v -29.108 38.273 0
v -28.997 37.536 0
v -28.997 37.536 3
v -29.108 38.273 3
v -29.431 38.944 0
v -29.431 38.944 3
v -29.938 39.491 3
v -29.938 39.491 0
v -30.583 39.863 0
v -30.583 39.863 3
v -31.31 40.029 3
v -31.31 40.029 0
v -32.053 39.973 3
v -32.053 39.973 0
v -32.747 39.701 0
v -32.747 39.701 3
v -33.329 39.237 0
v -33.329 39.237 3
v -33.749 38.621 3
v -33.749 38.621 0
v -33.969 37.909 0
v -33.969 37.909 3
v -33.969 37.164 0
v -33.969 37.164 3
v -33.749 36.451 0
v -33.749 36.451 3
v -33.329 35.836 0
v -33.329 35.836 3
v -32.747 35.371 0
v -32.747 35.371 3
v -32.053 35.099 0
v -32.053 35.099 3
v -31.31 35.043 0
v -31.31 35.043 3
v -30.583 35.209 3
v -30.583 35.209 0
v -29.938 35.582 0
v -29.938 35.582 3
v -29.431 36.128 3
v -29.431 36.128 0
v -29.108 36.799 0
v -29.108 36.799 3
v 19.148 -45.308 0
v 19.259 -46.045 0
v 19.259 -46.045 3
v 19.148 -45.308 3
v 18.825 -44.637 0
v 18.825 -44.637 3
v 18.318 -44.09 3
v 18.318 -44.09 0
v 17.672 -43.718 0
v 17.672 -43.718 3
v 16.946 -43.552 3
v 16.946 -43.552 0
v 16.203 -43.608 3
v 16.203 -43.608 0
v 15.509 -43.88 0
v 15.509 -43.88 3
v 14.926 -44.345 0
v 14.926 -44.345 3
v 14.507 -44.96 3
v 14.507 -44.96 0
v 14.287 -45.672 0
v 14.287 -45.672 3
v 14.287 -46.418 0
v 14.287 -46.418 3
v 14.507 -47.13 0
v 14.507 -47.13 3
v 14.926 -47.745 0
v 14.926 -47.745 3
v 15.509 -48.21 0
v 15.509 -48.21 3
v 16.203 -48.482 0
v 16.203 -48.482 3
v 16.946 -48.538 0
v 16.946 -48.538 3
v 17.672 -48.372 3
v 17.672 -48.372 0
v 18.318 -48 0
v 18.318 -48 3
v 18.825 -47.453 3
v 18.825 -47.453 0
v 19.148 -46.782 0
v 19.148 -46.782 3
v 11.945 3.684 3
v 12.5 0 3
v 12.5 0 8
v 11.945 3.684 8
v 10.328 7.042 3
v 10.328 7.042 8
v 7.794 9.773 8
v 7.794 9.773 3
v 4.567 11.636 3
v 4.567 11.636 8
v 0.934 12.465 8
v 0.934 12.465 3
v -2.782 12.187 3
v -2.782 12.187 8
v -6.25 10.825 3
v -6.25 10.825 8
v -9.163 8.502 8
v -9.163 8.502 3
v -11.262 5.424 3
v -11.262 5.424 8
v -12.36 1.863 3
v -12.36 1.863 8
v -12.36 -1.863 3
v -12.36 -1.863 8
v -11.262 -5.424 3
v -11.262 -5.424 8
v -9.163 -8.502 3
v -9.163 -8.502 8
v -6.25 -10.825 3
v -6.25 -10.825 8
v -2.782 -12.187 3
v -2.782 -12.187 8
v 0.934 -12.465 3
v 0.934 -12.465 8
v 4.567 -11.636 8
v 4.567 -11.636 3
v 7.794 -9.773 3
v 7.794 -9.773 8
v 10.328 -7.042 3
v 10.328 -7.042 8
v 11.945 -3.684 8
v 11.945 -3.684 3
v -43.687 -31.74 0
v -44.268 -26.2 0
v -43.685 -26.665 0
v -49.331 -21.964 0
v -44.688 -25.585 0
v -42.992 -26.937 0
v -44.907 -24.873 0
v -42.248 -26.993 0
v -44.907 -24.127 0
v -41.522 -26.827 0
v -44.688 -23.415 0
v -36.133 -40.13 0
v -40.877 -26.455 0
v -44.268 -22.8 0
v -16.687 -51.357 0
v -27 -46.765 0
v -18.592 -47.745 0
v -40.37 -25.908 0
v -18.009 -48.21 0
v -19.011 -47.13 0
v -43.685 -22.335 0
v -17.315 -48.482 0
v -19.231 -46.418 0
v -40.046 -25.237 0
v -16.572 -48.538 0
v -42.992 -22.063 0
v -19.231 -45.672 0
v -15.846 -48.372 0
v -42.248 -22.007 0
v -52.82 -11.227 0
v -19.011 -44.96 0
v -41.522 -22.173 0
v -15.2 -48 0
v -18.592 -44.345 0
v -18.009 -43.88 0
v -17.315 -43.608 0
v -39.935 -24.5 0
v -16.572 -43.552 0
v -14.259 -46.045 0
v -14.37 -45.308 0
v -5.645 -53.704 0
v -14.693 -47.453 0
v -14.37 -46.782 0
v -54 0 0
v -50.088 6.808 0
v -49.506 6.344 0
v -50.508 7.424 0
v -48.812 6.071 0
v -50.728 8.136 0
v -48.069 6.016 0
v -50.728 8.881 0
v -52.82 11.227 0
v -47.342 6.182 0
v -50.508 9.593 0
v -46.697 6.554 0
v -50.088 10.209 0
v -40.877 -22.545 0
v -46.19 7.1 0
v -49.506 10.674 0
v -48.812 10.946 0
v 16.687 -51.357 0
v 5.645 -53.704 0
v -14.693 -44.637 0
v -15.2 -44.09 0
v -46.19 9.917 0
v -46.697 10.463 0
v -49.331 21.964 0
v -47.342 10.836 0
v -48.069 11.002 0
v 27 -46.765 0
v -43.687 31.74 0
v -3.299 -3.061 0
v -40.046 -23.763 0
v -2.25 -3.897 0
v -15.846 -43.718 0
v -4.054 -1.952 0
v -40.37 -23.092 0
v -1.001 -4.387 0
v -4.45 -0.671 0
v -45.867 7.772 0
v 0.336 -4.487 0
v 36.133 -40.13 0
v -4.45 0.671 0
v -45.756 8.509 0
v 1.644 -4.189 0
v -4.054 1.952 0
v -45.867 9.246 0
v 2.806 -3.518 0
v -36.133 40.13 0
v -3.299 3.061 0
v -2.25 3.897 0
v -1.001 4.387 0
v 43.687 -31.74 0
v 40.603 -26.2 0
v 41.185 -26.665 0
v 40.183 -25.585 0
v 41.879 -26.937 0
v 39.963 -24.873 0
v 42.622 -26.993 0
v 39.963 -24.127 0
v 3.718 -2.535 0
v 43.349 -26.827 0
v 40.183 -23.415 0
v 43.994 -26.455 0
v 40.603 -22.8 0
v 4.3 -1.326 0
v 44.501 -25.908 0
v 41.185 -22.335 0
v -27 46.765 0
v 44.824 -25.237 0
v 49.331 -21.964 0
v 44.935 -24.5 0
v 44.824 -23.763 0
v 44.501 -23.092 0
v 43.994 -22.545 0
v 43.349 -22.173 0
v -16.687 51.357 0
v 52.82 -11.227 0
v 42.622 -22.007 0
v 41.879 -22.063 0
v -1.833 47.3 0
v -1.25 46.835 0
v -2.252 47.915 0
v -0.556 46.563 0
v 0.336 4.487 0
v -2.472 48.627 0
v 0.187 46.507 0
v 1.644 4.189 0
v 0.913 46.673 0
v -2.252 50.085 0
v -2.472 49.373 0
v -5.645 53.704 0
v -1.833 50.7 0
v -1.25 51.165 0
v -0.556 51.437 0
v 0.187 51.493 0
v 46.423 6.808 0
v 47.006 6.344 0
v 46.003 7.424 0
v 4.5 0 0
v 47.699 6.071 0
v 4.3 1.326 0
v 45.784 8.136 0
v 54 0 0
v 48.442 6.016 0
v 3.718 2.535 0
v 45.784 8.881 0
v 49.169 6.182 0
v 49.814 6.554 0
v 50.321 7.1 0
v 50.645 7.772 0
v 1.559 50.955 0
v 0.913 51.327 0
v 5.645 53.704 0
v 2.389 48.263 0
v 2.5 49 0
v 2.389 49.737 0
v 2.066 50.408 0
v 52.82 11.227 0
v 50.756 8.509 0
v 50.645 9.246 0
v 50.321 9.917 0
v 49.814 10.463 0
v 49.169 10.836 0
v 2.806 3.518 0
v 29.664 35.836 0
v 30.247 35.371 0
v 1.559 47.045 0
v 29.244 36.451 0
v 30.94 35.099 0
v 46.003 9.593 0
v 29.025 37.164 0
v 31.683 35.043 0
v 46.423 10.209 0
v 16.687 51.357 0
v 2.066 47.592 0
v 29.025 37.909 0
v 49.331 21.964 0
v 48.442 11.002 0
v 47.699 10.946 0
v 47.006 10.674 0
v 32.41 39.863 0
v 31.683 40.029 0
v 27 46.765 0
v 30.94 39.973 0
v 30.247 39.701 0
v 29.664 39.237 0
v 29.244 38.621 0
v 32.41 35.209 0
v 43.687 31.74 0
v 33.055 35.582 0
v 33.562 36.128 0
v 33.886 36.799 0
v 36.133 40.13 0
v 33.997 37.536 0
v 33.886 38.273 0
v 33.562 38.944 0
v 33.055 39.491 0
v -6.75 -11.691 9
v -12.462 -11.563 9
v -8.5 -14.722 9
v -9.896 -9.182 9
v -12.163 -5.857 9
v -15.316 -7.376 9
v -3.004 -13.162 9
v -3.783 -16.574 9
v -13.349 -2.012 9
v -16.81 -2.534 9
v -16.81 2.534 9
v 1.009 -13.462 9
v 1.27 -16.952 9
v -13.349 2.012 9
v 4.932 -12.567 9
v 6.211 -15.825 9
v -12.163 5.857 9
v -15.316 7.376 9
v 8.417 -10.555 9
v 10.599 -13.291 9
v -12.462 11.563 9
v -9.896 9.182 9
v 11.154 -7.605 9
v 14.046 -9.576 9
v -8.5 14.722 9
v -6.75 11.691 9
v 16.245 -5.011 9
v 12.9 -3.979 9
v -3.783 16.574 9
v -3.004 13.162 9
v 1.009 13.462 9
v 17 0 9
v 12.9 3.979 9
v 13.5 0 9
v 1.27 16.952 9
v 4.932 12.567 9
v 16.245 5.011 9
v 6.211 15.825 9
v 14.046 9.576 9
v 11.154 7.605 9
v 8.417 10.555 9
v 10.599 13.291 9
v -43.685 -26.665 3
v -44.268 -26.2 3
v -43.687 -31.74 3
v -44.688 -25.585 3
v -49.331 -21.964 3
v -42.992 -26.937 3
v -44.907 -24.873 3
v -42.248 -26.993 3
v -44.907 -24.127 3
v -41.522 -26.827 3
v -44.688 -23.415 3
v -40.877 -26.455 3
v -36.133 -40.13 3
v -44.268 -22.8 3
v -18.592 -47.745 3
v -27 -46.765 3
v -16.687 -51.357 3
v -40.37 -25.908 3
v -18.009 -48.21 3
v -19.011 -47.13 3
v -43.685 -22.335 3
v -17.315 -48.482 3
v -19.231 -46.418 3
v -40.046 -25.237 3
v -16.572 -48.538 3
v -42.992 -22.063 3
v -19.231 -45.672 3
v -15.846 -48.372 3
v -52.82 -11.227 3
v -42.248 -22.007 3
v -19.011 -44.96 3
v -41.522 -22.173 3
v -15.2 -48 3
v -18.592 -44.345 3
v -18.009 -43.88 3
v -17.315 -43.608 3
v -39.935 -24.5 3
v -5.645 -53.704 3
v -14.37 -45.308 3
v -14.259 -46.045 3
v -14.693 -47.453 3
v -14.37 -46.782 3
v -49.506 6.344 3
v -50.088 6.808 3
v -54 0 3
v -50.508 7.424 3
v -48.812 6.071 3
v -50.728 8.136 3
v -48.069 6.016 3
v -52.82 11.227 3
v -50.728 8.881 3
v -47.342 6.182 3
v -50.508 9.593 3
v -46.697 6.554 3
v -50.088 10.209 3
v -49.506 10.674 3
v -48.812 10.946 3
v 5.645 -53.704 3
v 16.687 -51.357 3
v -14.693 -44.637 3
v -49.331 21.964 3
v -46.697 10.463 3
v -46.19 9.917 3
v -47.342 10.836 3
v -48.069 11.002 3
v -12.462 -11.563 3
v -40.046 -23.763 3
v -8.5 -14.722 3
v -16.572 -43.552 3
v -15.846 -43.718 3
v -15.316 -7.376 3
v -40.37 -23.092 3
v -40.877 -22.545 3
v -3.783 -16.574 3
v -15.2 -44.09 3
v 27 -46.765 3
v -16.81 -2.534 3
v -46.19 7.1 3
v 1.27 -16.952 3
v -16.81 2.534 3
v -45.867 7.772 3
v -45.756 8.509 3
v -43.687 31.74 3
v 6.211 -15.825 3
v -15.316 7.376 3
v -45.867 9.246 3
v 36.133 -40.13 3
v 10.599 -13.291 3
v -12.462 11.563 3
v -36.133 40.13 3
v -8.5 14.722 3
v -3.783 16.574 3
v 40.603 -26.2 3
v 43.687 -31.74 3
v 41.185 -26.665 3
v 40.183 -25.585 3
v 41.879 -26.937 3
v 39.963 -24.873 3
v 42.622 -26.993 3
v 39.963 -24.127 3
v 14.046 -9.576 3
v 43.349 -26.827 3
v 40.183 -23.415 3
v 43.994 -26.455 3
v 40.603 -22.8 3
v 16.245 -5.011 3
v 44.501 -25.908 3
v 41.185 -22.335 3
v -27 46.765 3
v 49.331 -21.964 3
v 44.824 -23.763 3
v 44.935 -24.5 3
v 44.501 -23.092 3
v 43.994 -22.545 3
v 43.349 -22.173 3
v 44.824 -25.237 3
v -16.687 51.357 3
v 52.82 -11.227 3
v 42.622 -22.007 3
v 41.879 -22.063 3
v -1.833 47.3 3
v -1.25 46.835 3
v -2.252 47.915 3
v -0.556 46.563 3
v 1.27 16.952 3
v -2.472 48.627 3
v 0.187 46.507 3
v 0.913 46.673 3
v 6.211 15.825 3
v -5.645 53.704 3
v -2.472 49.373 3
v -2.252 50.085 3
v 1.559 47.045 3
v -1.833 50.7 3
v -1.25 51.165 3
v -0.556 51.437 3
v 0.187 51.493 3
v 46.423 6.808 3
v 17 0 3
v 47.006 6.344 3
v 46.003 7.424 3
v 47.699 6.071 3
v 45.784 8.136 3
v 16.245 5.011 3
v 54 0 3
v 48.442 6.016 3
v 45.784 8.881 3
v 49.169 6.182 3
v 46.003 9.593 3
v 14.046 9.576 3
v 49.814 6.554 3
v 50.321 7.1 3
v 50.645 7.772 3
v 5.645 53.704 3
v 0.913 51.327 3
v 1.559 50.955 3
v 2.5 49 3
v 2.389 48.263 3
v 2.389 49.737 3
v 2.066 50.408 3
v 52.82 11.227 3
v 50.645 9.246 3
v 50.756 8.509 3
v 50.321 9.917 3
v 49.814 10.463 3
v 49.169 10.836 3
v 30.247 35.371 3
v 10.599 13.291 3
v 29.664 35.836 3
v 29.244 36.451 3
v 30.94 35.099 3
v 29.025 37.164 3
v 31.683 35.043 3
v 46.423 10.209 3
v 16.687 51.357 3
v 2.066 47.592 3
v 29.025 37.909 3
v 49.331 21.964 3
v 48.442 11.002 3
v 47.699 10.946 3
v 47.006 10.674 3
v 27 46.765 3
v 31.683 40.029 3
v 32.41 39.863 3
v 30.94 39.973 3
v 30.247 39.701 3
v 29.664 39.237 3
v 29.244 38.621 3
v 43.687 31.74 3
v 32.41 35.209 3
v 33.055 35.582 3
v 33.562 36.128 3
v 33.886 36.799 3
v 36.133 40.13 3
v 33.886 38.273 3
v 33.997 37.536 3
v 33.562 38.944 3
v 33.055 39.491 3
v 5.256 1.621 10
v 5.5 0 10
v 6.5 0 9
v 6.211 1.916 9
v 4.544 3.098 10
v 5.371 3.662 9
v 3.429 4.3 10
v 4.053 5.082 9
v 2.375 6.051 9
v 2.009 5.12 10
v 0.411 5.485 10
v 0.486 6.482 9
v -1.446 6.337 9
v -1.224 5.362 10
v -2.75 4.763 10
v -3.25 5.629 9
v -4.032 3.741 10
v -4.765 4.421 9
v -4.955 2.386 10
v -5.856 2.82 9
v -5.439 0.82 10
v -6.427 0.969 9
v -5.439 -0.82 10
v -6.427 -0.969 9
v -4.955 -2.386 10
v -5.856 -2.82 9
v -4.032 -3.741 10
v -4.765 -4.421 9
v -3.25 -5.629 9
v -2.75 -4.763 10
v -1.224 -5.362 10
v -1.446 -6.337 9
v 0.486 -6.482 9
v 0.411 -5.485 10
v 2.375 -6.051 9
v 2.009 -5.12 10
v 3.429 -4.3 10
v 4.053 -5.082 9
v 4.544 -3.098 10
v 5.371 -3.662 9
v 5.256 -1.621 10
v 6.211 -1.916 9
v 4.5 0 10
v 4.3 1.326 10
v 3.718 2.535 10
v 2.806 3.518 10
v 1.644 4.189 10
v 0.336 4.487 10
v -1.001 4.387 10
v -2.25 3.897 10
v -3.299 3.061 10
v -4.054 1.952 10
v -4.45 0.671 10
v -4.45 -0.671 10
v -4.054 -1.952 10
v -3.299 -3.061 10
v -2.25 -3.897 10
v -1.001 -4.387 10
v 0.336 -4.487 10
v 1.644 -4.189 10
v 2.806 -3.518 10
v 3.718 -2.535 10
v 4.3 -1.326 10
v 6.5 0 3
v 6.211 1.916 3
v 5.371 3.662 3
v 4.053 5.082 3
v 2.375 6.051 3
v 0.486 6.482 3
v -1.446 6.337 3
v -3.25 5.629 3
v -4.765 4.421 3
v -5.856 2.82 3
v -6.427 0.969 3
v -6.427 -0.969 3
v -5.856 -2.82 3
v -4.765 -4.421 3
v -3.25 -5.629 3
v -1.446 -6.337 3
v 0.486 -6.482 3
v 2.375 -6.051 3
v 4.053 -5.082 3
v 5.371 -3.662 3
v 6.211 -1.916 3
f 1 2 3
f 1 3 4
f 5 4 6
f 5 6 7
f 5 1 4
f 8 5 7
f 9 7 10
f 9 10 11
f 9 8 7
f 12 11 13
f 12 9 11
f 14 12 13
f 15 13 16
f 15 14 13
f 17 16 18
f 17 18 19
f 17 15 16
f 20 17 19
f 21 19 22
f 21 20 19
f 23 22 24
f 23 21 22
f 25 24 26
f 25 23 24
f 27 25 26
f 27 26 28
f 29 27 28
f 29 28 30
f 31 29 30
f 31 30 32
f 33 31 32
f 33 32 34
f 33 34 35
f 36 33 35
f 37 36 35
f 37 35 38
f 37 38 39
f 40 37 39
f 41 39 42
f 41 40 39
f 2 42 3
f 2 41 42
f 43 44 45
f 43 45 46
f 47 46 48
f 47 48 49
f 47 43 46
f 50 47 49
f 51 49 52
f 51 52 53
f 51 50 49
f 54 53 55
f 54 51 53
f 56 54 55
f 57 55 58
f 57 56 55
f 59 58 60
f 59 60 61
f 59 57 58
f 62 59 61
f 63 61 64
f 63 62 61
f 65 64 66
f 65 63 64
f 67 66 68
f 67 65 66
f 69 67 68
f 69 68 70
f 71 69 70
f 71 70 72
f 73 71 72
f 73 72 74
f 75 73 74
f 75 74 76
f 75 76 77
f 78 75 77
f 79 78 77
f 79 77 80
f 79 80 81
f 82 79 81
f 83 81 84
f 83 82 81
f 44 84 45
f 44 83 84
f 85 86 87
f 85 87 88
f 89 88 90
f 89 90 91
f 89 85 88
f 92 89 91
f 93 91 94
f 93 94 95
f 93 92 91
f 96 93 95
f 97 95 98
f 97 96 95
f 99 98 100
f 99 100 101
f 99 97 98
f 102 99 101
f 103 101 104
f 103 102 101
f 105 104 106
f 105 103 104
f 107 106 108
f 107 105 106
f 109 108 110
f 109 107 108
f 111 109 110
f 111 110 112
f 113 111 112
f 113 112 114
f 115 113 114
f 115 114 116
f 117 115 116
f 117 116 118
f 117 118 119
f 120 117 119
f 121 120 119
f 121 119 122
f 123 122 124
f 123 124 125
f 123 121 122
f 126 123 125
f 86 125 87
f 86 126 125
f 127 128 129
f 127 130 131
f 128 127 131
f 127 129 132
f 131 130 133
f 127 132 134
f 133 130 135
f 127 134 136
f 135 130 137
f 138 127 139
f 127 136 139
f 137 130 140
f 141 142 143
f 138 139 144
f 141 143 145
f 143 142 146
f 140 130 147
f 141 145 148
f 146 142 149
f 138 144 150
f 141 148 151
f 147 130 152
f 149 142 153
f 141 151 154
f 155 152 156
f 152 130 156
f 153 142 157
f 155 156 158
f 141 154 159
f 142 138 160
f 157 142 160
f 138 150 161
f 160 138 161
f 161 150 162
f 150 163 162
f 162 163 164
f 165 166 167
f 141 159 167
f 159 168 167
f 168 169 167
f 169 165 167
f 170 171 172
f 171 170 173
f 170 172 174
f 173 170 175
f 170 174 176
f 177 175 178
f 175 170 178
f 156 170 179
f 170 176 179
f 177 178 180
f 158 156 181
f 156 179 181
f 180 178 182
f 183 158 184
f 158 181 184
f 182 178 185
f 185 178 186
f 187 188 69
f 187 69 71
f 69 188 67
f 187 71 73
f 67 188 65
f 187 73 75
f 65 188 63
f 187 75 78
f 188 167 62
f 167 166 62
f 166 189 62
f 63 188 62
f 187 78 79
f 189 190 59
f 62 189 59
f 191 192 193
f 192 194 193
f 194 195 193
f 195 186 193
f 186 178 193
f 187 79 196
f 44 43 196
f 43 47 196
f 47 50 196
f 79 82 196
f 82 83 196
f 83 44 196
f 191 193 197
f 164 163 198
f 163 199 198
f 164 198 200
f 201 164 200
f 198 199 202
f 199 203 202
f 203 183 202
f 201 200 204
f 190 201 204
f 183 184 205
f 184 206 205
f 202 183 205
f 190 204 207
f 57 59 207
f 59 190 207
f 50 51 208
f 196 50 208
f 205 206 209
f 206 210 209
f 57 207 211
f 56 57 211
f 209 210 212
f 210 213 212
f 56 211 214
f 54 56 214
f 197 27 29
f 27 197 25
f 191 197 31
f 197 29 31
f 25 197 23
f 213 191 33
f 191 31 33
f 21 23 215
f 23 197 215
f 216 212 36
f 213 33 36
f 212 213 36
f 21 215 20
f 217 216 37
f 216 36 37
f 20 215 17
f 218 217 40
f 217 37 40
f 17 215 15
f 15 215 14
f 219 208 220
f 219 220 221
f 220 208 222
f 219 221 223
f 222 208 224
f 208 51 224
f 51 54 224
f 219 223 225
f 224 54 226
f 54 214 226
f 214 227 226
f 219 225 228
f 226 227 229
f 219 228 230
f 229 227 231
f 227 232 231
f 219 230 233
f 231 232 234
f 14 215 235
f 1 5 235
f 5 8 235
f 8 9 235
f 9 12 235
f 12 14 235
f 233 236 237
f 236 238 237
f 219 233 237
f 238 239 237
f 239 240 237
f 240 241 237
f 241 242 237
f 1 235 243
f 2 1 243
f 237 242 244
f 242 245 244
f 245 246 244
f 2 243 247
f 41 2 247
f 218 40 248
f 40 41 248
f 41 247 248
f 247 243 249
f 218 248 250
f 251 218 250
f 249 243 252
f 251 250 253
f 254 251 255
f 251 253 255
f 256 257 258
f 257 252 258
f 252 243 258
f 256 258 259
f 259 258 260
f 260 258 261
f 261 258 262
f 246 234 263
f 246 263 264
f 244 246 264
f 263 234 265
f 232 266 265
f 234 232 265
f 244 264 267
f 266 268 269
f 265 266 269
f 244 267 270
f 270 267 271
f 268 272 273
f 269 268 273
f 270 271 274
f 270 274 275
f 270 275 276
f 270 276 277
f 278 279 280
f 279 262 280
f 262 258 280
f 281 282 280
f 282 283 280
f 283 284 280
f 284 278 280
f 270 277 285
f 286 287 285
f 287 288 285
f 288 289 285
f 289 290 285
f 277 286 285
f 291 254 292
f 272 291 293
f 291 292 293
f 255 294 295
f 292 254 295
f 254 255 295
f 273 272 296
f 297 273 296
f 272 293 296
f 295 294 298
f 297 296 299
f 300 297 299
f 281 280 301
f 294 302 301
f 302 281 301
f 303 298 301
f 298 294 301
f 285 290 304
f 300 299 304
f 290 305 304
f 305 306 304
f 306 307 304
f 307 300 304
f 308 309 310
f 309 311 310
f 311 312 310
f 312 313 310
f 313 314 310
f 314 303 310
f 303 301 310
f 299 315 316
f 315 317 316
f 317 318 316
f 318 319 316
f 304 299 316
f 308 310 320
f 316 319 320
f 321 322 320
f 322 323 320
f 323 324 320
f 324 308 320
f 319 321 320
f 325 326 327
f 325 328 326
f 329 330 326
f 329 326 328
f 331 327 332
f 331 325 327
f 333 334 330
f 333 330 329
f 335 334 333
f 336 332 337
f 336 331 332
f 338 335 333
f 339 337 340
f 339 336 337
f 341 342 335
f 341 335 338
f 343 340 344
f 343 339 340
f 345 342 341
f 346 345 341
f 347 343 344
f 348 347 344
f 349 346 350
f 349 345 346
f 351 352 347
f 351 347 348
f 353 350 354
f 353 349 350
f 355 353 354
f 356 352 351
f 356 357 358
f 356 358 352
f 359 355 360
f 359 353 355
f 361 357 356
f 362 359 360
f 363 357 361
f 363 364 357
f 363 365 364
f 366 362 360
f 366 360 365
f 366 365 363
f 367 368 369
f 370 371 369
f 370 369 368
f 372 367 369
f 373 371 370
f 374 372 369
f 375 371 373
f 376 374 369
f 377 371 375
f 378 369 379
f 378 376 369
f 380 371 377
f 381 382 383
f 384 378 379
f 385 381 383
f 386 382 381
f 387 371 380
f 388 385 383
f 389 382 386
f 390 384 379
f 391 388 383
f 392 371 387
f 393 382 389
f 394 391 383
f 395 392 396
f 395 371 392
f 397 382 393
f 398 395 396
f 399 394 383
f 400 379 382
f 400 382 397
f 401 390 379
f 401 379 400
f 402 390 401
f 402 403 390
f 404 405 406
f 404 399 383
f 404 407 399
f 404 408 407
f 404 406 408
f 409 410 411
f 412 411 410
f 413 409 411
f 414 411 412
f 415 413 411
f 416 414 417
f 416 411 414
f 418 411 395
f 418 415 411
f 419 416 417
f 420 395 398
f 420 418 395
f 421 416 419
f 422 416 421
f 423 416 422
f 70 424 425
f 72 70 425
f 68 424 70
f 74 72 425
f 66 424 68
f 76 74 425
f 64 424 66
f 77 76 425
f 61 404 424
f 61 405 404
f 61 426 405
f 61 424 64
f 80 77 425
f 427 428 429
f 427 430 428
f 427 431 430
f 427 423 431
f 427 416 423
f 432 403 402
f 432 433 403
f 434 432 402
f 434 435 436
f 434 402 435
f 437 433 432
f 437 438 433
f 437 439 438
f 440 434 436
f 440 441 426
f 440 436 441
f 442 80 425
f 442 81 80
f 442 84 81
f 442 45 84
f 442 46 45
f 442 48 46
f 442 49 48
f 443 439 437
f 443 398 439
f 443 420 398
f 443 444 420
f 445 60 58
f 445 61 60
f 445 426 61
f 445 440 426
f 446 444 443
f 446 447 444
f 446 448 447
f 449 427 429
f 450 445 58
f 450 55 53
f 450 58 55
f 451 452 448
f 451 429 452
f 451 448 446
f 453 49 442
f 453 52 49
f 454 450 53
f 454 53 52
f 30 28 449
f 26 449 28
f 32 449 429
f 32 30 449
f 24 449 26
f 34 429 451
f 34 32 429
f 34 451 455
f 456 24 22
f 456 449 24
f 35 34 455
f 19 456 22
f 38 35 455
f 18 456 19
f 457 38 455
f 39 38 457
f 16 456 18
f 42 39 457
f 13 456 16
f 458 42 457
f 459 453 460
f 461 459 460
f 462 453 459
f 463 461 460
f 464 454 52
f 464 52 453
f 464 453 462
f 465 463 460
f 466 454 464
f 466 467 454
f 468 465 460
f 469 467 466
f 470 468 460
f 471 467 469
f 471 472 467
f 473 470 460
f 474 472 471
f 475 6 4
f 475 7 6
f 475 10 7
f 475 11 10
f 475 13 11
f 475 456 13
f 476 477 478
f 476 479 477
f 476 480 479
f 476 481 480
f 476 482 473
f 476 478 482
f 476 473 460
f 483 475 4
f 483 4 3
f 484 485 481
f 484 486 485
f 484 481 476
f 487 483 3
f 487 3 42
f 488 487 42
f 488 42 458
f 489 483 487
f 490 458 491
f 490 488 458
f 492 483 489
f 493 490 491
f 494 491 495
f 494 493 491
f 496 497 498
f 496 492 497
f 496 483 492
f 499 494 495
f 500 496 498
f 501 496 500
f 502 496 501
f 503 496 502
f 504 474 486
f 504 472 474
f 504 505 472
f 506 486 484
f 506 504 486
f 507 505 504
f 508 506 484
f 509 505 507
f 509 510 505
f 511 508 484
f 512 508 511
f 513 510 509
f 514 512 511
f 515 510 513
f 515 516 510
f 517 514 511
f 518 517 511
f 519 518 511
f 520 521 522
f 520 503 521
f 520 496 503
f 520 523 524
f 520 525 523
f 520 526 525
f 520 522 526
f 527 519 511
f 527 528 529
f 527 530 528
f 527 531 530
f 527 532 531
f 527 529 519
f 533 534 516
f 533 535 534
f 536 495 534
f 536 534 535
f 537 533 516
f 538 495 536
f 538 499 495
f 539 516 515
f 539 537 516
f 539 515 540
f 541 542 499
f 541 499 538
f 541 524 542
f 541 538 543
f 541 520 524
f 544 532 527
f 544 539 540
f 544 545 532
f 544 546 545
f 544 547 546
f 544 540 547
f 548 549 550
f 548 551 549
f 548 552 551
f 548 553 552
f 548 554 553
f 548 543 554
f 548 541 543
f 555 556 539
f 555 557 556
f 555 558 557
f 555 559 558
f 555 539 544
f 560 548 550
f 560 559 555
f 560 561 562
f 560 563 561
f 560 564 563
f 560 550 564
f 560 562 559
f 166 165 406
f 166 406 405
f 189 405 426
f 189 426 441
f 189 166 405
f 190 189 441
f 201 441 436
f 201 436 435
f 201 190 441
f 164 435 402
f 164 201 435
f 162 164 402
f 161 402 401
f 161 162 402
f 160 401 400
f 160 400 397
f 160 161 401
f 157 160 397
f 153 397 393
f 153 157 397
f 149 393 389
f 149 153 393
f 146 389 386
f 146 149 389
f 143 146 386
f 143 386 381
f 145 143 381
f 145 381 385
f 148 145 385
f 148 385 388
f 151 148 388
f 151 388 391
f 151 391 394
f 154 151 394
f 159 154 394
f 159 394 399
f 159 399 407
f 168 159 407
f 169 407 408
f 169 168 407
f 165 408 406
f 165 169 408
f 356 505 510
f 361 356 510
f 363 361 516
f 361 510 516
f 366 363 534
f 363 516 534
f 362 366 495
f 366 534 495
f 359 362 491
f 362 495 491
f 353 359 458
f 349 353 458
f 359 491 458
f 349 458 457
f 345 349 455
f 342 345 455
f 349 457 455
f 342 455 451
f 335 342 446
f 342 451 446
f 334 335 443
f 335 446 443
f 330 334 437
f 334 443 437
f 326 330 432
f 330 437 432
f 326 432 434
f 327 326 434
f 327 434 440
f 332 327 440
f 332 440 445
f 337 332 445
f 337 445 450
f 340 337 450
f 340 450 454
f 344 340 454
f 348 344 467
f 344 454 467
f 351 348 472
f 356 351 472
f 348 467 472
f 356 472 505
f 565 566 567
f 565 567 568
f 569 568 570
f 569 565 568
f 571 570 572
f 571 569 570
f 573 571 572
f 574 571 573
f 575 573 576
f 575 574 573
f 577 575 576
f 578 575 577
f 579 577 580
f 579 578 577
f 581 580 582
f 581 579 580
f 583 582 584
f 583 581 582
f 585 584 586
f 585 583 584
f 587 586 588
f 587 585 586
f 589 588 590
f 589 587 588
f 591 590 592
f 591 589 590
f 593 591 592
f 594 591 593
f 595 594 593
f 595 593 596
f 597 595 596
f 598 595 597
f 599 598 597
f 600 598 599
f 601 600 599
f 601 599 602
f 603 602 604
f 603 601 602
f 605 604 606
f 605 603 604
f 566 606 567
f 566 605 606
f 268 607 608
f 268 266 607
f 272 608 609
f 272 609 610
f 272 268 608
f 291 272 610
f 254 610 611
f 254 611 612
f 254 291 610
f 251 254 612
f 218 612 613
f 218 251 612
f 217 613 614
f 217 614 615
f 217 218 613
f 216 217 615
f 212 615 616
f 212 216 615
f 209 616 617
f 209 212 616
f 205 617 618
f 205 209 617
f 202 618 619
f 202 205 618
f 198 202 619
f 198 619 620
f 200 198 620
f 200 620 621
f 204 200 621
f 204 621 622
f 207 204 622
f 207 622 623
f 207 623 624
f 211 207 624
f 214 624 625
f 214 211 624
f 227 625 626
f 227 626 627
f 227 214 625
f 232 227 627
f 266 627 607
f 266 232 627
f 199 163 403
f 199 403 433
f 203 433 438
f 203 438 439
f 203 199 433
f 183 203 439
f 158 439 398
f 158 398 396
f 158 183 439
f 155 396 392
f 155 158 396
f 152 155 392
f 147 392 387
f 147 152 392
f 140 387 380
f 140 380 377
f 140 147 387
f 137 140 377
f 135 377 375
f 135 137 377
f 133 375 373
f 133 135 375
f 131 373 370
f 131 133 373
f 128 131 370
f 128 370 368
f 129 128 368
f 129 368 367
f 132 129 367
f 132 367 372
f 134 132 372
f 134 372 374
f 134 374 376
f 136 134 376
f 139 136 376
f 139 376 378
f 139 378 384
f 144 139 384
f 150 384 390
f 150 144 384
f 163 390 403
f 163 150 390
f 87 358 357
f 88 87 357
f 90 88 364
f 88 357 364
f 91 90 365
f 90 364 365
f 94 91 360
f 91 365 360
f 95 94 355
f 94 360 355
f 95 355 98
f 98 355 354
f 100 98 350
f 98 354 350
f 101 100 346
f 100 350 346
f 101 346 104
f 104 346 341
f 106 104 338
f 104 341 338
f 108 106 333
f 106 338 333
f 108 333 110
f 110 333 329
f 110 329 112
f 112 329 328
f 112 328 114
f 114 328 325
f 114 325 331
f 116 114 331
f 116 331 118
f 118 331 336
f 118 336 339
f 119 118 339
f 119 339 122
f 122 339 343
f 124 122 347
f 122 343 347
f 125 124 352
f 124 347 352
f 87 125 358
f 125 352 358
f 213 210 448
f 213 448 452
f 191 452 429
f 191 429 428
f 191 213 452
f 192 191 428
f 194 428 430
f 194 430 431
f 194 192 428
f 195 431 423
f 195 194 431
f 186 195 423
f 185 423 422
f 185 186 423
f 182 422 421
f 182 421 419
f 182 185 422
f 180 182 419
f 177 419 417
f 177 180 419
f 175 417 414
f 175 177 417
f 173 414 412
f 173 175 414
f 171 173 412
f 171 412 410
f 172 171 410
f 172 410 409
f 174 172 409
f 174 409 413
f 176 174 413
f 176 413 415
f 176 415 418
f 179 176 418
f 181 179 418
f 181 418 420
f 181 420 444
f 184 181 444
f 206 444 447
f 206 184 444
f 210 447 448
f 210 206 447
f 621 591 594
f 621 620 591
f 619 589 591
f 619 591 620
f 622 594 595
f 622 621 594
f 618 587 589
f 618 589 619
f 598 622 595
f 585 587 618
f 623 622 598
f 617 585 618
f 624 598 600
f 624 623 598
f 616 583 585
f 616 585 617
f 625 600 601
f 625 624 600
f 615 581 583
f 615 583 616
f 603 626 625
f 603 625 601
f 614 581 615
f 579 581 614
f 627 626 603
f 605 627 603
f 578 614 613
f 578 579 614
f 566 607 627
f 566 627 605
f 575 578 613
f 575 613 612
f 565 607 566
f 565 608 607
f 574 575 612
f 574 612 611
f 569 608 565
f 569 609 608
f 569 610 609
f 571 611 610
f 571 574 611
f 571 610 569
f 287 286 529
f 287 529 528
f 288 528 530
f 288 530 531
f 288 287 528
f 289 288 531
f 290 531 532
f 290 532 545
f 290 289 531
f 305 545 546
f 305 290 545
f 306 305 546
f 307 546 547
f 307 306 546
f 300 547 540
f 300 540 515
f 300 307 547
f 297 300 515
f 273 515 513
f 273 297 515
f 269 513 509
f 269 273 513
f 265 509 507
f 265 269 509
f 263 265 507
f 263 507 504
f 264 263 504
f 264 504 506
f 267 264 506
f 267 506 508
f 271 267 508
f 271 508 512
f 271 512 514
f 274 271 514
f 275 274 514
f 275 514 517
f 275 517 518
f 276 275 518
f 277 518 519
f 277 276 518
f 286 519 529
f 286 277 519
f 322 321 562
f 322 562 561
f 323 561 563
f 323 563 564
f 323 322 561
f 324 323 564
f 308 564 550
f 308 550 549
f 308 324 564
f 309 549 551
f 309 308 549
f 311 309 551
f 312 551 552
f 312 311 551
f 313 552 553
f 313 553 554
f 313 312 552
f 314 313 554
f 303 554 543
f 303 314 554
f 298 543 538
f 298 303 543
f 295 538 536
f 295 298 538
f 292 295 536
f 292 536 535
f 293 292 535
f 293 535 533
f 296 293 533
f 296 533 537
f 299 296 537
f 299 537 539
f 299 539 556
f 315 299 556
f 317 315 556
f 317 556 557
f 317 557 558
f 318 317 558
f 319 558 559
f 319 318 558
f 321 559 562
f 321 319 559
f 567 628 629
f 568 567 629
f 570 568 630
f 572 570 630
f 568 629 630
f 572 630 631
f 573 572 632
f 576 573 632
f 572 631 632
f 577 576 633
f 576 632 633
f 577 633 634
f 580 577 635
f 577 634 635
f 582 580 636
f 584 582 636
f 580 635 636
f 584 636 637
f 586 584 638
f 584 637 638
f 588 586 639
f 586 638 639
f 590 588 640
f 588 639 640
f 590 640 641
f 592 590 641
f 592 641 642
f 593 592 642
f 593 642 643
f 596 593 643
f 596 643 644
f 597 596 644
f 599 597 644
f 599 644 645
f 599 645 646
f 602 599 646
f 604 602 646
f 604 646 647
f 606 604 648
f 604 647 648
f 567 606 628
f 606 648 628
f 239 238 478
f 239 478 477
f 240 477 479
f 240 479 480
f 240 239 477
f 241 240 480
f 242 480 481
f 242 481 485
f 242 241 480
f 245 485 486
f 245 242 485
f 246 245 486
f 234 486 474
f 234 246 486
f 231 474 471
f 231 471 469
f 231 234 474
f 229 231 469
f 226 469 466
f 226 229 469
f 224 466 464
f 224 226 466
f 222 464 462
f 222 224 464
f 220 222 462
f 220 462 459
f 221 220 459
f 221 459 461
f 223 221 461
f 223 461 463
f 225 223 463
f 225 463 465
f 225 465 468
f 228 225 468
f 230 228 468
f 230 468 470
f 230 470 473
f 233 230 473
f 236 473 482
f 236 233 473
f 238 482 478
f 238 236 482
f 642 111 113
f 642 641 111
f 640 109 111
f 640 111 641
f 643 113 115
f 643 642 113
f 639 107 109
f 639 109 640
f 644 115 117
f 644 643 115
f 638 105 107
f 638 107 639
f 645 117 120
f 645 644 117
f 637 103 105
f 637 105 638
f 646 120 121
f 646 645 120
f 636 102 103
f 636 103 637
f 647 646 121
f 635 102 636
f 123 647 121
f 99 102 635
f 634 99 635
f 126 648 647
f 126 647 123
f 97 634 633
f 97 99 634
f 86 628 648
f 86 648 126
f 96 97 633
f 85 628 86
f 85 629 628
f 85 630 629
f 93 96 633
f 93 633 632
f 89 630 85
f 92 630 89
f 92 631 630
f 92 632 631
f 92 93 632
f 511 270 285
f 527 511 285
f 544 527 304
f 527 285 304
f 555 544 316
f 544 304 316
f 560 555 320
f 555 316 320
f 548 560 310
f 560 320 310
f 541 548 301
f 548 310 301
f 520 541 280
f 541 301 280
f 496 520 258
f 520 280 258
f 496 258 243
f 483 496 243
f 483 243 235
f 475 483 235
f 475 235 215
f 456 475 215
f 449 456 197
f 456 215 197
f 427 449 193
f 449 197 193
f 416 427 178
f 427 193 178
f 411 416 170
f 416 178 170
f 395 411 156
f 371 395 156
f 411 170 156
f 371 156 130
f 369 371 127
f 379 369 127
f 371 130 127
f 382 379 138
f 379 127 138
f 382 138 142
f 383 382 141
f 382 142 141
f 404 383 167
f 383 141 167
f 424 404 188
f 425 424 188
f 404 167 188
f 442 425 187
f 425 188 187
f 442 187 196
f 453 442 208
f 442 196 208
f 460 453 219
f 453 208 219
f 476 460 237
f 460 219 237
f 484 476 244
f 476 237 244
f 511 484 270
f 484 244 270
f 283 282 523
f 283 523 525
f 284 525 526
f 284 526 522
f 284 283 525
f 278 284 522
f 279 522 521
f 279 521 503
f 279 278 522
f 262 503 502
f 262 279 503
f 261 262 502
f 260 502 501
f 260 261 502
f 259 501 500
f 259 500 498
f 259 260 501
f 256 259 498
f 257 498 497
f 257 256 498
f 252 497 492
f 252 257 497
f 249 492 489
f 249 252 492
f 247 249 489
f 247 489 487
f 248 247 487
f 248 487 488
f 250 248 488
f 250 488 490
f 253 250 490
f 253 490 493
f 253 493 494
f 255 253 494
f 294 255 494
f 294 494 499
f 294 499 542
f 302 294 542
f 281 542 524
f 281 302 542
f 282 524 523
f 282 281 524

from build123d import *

# Parameters (mm, degrees)
SKETCH_R        = 54
SKETCH_R_2      = 4.5
SKETCH_R_3      = 2.5
PAD_DEPTH       = 3
SKETCH001_R     = 6.5
SKETCH001_R_2   = 4.5
PAD001_DEPTH    = 7
CHAMFER_SIZE    = 1
SKETCH002_R     = 17
SKETCH002_R_2   = 12.5
PAD002_DEPTH    = 6
CHAMFER001_SIZE = 1


with BuildPart() as part:
    # Sketch → Pad (new body)
    with BuildSketch(Plane.XY):
        Circle(SKETCH_R)
        Circle(SKETCH_R_2, mode=Mode.SUBTRACT)
        with Locations((0, 49)):
            Circle(SKETCH_R_3, mode=Mode.SUBTRACT)
        with Locations((48.25558, 8.508761)):
            Circle(SKETCH_R_3, mode=Mode.SUBTRACT)
        with Locations((42.435245, -24.5)):
            Circle(SKETCH_R_3, mode=Mode.SUBTRACT)
        with Locations((16.758987, -46.044938)):
            Circle(SKETCH_R_3, mode=Mode.SUBTRACT)
        with Locations((-16.758987, -46.044938)):
            Circle(SKETCH_R_3, mode=Mode.SUBTRACT)
        with Locations((-42.435245, -24.5)):
            Circle(SKETCH_R_3, mode=Mode.SUBTRACT)
        with Locations((-48.25558, 8.508761)):
            Circle(SKETCH_R_3, mode=Mode.SUBTRACT)
        with Locations((-31.496593, 37.536178)):
            Circle(SKETCH_R_3, mode=Mode.SUBTRACT)
        with Locations((31.496593, 37.536178)):
            Circle(SKETCH_R_3, mode=Mode.SUBTRACT)
    extrude(amount=PAD_DEPTH)

    # Sketch001 (on Face13 of Pad) → Pad001 (join)
    with BuildSketch(Plane.XY.offset(3)):
        Circle(SKETCH001_R)
        Circle(SKETCH001_R_2, mode=Mode.SUBTRACT)
    extrude(amount=PAD001_DEPTH)

    # Chamfer
    chamfer_edges = [part.edges().sort_by_distance(p)[0] for p in [
        (-6.5, 0, 10),
    ]]
    chamfer(chamfer_edges, length=CHAMFER_SIZE)

    # Sketch002 (on Face3 of Chamfer) → Pad002 (join)
    with BuildSketch(Plane.XY.offset(3)):
        Circle(SKETCH002_R)
        Circle(SKETCH002_R_2, mode=Mode.SUBTRACT)
    extrude(amount=PAD002_DEPTH)

    # Chamfer001
    chamfer001_edges = [part.edges().sort_by_distance(p)[0] for p in [
        (-12.5, 0, 9),
    ]]
    chamfer(chamfer001_edges, length=CHAMFER001_SIZE)


solid = part.part
